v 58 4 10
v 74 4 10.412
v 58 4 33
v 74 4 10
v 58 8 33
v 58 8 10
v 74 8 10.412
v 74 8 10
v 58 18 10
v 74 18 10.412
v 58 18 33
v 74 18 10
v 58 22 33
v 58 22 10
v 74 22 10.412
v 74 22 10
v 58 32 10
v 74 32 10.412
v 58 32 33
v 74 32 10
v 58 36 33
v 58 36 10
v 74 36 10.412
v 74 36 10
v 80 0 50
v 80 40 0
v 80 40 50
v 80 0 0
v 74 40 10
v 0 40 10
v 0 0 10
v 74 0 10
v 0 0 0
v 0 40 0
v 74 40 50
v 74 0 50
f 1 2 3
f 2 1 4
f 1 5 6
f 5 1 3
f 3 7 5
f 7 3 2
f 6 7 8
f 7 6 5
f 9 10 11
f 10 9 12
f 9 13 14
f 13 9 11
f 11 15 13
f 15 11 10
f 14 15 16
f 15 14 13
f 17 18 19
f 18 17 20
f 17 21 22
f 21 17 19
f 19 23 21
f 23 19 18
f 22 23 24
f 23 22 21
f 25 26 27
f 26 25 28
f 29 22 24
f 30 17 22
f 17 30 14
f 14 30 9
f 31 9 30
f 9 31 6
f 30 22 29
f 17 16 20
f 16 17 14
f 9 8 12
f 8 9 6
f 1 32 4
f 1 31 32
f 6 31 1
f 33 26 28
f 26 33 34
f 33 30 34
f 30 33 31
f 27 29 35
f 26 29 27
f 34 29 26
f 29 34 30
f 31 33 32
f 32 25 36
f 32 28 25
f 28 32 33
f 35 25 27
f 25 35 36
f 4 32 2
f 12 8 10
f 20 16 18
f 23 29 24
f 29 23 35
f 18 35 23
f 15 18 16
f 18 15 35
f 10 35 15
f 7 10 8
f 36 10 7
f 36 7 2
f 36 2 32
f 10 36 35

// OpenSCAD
$fn = 32;

// ----------------------------------------------------------------------
// Rib bracket: 3-gusset L bracket
// ----------------------------------------------------------------------

// --- parameters (mm) ---
base_l = 80;              // foot length, X
base_w = 40;              // foot width, Y
base_t = 10;              // foot thickness
plate_t = 6;              // upright plate thickness
plate_h = 50;             // overall height
gus_l = 16;               // gusset leg along the foot
gus_h = 24;               // gusset height
gus_t = 4;                // gusset thickness
gus_edge = 4;             // gusset margin from the foot edge
n_gus = 3;                // gusset count

gus_pitch = (base_w - 2 * gus_edge - gus_t) / (n_gus - 1);  // gusset pitch

union() {
  cube([base_l, base_w, base_t]);
  translate([base_l - plate_t, 0, base_t - 1])
    cube([plate_t, base_w, plate_h - base_t + 1]);
  for (i = [0 : n_gus - 1])
    translate([base_l - plate_t - gus_l, gus_edge + i * gus_pitch, base_t - 1])
      rotate([-90, 0, 0])
        linear_extrude(height = gus_t)
          polygon(points = [[0, 0], [gus_l + 1, 0], [0, -gus_h]]);
}
